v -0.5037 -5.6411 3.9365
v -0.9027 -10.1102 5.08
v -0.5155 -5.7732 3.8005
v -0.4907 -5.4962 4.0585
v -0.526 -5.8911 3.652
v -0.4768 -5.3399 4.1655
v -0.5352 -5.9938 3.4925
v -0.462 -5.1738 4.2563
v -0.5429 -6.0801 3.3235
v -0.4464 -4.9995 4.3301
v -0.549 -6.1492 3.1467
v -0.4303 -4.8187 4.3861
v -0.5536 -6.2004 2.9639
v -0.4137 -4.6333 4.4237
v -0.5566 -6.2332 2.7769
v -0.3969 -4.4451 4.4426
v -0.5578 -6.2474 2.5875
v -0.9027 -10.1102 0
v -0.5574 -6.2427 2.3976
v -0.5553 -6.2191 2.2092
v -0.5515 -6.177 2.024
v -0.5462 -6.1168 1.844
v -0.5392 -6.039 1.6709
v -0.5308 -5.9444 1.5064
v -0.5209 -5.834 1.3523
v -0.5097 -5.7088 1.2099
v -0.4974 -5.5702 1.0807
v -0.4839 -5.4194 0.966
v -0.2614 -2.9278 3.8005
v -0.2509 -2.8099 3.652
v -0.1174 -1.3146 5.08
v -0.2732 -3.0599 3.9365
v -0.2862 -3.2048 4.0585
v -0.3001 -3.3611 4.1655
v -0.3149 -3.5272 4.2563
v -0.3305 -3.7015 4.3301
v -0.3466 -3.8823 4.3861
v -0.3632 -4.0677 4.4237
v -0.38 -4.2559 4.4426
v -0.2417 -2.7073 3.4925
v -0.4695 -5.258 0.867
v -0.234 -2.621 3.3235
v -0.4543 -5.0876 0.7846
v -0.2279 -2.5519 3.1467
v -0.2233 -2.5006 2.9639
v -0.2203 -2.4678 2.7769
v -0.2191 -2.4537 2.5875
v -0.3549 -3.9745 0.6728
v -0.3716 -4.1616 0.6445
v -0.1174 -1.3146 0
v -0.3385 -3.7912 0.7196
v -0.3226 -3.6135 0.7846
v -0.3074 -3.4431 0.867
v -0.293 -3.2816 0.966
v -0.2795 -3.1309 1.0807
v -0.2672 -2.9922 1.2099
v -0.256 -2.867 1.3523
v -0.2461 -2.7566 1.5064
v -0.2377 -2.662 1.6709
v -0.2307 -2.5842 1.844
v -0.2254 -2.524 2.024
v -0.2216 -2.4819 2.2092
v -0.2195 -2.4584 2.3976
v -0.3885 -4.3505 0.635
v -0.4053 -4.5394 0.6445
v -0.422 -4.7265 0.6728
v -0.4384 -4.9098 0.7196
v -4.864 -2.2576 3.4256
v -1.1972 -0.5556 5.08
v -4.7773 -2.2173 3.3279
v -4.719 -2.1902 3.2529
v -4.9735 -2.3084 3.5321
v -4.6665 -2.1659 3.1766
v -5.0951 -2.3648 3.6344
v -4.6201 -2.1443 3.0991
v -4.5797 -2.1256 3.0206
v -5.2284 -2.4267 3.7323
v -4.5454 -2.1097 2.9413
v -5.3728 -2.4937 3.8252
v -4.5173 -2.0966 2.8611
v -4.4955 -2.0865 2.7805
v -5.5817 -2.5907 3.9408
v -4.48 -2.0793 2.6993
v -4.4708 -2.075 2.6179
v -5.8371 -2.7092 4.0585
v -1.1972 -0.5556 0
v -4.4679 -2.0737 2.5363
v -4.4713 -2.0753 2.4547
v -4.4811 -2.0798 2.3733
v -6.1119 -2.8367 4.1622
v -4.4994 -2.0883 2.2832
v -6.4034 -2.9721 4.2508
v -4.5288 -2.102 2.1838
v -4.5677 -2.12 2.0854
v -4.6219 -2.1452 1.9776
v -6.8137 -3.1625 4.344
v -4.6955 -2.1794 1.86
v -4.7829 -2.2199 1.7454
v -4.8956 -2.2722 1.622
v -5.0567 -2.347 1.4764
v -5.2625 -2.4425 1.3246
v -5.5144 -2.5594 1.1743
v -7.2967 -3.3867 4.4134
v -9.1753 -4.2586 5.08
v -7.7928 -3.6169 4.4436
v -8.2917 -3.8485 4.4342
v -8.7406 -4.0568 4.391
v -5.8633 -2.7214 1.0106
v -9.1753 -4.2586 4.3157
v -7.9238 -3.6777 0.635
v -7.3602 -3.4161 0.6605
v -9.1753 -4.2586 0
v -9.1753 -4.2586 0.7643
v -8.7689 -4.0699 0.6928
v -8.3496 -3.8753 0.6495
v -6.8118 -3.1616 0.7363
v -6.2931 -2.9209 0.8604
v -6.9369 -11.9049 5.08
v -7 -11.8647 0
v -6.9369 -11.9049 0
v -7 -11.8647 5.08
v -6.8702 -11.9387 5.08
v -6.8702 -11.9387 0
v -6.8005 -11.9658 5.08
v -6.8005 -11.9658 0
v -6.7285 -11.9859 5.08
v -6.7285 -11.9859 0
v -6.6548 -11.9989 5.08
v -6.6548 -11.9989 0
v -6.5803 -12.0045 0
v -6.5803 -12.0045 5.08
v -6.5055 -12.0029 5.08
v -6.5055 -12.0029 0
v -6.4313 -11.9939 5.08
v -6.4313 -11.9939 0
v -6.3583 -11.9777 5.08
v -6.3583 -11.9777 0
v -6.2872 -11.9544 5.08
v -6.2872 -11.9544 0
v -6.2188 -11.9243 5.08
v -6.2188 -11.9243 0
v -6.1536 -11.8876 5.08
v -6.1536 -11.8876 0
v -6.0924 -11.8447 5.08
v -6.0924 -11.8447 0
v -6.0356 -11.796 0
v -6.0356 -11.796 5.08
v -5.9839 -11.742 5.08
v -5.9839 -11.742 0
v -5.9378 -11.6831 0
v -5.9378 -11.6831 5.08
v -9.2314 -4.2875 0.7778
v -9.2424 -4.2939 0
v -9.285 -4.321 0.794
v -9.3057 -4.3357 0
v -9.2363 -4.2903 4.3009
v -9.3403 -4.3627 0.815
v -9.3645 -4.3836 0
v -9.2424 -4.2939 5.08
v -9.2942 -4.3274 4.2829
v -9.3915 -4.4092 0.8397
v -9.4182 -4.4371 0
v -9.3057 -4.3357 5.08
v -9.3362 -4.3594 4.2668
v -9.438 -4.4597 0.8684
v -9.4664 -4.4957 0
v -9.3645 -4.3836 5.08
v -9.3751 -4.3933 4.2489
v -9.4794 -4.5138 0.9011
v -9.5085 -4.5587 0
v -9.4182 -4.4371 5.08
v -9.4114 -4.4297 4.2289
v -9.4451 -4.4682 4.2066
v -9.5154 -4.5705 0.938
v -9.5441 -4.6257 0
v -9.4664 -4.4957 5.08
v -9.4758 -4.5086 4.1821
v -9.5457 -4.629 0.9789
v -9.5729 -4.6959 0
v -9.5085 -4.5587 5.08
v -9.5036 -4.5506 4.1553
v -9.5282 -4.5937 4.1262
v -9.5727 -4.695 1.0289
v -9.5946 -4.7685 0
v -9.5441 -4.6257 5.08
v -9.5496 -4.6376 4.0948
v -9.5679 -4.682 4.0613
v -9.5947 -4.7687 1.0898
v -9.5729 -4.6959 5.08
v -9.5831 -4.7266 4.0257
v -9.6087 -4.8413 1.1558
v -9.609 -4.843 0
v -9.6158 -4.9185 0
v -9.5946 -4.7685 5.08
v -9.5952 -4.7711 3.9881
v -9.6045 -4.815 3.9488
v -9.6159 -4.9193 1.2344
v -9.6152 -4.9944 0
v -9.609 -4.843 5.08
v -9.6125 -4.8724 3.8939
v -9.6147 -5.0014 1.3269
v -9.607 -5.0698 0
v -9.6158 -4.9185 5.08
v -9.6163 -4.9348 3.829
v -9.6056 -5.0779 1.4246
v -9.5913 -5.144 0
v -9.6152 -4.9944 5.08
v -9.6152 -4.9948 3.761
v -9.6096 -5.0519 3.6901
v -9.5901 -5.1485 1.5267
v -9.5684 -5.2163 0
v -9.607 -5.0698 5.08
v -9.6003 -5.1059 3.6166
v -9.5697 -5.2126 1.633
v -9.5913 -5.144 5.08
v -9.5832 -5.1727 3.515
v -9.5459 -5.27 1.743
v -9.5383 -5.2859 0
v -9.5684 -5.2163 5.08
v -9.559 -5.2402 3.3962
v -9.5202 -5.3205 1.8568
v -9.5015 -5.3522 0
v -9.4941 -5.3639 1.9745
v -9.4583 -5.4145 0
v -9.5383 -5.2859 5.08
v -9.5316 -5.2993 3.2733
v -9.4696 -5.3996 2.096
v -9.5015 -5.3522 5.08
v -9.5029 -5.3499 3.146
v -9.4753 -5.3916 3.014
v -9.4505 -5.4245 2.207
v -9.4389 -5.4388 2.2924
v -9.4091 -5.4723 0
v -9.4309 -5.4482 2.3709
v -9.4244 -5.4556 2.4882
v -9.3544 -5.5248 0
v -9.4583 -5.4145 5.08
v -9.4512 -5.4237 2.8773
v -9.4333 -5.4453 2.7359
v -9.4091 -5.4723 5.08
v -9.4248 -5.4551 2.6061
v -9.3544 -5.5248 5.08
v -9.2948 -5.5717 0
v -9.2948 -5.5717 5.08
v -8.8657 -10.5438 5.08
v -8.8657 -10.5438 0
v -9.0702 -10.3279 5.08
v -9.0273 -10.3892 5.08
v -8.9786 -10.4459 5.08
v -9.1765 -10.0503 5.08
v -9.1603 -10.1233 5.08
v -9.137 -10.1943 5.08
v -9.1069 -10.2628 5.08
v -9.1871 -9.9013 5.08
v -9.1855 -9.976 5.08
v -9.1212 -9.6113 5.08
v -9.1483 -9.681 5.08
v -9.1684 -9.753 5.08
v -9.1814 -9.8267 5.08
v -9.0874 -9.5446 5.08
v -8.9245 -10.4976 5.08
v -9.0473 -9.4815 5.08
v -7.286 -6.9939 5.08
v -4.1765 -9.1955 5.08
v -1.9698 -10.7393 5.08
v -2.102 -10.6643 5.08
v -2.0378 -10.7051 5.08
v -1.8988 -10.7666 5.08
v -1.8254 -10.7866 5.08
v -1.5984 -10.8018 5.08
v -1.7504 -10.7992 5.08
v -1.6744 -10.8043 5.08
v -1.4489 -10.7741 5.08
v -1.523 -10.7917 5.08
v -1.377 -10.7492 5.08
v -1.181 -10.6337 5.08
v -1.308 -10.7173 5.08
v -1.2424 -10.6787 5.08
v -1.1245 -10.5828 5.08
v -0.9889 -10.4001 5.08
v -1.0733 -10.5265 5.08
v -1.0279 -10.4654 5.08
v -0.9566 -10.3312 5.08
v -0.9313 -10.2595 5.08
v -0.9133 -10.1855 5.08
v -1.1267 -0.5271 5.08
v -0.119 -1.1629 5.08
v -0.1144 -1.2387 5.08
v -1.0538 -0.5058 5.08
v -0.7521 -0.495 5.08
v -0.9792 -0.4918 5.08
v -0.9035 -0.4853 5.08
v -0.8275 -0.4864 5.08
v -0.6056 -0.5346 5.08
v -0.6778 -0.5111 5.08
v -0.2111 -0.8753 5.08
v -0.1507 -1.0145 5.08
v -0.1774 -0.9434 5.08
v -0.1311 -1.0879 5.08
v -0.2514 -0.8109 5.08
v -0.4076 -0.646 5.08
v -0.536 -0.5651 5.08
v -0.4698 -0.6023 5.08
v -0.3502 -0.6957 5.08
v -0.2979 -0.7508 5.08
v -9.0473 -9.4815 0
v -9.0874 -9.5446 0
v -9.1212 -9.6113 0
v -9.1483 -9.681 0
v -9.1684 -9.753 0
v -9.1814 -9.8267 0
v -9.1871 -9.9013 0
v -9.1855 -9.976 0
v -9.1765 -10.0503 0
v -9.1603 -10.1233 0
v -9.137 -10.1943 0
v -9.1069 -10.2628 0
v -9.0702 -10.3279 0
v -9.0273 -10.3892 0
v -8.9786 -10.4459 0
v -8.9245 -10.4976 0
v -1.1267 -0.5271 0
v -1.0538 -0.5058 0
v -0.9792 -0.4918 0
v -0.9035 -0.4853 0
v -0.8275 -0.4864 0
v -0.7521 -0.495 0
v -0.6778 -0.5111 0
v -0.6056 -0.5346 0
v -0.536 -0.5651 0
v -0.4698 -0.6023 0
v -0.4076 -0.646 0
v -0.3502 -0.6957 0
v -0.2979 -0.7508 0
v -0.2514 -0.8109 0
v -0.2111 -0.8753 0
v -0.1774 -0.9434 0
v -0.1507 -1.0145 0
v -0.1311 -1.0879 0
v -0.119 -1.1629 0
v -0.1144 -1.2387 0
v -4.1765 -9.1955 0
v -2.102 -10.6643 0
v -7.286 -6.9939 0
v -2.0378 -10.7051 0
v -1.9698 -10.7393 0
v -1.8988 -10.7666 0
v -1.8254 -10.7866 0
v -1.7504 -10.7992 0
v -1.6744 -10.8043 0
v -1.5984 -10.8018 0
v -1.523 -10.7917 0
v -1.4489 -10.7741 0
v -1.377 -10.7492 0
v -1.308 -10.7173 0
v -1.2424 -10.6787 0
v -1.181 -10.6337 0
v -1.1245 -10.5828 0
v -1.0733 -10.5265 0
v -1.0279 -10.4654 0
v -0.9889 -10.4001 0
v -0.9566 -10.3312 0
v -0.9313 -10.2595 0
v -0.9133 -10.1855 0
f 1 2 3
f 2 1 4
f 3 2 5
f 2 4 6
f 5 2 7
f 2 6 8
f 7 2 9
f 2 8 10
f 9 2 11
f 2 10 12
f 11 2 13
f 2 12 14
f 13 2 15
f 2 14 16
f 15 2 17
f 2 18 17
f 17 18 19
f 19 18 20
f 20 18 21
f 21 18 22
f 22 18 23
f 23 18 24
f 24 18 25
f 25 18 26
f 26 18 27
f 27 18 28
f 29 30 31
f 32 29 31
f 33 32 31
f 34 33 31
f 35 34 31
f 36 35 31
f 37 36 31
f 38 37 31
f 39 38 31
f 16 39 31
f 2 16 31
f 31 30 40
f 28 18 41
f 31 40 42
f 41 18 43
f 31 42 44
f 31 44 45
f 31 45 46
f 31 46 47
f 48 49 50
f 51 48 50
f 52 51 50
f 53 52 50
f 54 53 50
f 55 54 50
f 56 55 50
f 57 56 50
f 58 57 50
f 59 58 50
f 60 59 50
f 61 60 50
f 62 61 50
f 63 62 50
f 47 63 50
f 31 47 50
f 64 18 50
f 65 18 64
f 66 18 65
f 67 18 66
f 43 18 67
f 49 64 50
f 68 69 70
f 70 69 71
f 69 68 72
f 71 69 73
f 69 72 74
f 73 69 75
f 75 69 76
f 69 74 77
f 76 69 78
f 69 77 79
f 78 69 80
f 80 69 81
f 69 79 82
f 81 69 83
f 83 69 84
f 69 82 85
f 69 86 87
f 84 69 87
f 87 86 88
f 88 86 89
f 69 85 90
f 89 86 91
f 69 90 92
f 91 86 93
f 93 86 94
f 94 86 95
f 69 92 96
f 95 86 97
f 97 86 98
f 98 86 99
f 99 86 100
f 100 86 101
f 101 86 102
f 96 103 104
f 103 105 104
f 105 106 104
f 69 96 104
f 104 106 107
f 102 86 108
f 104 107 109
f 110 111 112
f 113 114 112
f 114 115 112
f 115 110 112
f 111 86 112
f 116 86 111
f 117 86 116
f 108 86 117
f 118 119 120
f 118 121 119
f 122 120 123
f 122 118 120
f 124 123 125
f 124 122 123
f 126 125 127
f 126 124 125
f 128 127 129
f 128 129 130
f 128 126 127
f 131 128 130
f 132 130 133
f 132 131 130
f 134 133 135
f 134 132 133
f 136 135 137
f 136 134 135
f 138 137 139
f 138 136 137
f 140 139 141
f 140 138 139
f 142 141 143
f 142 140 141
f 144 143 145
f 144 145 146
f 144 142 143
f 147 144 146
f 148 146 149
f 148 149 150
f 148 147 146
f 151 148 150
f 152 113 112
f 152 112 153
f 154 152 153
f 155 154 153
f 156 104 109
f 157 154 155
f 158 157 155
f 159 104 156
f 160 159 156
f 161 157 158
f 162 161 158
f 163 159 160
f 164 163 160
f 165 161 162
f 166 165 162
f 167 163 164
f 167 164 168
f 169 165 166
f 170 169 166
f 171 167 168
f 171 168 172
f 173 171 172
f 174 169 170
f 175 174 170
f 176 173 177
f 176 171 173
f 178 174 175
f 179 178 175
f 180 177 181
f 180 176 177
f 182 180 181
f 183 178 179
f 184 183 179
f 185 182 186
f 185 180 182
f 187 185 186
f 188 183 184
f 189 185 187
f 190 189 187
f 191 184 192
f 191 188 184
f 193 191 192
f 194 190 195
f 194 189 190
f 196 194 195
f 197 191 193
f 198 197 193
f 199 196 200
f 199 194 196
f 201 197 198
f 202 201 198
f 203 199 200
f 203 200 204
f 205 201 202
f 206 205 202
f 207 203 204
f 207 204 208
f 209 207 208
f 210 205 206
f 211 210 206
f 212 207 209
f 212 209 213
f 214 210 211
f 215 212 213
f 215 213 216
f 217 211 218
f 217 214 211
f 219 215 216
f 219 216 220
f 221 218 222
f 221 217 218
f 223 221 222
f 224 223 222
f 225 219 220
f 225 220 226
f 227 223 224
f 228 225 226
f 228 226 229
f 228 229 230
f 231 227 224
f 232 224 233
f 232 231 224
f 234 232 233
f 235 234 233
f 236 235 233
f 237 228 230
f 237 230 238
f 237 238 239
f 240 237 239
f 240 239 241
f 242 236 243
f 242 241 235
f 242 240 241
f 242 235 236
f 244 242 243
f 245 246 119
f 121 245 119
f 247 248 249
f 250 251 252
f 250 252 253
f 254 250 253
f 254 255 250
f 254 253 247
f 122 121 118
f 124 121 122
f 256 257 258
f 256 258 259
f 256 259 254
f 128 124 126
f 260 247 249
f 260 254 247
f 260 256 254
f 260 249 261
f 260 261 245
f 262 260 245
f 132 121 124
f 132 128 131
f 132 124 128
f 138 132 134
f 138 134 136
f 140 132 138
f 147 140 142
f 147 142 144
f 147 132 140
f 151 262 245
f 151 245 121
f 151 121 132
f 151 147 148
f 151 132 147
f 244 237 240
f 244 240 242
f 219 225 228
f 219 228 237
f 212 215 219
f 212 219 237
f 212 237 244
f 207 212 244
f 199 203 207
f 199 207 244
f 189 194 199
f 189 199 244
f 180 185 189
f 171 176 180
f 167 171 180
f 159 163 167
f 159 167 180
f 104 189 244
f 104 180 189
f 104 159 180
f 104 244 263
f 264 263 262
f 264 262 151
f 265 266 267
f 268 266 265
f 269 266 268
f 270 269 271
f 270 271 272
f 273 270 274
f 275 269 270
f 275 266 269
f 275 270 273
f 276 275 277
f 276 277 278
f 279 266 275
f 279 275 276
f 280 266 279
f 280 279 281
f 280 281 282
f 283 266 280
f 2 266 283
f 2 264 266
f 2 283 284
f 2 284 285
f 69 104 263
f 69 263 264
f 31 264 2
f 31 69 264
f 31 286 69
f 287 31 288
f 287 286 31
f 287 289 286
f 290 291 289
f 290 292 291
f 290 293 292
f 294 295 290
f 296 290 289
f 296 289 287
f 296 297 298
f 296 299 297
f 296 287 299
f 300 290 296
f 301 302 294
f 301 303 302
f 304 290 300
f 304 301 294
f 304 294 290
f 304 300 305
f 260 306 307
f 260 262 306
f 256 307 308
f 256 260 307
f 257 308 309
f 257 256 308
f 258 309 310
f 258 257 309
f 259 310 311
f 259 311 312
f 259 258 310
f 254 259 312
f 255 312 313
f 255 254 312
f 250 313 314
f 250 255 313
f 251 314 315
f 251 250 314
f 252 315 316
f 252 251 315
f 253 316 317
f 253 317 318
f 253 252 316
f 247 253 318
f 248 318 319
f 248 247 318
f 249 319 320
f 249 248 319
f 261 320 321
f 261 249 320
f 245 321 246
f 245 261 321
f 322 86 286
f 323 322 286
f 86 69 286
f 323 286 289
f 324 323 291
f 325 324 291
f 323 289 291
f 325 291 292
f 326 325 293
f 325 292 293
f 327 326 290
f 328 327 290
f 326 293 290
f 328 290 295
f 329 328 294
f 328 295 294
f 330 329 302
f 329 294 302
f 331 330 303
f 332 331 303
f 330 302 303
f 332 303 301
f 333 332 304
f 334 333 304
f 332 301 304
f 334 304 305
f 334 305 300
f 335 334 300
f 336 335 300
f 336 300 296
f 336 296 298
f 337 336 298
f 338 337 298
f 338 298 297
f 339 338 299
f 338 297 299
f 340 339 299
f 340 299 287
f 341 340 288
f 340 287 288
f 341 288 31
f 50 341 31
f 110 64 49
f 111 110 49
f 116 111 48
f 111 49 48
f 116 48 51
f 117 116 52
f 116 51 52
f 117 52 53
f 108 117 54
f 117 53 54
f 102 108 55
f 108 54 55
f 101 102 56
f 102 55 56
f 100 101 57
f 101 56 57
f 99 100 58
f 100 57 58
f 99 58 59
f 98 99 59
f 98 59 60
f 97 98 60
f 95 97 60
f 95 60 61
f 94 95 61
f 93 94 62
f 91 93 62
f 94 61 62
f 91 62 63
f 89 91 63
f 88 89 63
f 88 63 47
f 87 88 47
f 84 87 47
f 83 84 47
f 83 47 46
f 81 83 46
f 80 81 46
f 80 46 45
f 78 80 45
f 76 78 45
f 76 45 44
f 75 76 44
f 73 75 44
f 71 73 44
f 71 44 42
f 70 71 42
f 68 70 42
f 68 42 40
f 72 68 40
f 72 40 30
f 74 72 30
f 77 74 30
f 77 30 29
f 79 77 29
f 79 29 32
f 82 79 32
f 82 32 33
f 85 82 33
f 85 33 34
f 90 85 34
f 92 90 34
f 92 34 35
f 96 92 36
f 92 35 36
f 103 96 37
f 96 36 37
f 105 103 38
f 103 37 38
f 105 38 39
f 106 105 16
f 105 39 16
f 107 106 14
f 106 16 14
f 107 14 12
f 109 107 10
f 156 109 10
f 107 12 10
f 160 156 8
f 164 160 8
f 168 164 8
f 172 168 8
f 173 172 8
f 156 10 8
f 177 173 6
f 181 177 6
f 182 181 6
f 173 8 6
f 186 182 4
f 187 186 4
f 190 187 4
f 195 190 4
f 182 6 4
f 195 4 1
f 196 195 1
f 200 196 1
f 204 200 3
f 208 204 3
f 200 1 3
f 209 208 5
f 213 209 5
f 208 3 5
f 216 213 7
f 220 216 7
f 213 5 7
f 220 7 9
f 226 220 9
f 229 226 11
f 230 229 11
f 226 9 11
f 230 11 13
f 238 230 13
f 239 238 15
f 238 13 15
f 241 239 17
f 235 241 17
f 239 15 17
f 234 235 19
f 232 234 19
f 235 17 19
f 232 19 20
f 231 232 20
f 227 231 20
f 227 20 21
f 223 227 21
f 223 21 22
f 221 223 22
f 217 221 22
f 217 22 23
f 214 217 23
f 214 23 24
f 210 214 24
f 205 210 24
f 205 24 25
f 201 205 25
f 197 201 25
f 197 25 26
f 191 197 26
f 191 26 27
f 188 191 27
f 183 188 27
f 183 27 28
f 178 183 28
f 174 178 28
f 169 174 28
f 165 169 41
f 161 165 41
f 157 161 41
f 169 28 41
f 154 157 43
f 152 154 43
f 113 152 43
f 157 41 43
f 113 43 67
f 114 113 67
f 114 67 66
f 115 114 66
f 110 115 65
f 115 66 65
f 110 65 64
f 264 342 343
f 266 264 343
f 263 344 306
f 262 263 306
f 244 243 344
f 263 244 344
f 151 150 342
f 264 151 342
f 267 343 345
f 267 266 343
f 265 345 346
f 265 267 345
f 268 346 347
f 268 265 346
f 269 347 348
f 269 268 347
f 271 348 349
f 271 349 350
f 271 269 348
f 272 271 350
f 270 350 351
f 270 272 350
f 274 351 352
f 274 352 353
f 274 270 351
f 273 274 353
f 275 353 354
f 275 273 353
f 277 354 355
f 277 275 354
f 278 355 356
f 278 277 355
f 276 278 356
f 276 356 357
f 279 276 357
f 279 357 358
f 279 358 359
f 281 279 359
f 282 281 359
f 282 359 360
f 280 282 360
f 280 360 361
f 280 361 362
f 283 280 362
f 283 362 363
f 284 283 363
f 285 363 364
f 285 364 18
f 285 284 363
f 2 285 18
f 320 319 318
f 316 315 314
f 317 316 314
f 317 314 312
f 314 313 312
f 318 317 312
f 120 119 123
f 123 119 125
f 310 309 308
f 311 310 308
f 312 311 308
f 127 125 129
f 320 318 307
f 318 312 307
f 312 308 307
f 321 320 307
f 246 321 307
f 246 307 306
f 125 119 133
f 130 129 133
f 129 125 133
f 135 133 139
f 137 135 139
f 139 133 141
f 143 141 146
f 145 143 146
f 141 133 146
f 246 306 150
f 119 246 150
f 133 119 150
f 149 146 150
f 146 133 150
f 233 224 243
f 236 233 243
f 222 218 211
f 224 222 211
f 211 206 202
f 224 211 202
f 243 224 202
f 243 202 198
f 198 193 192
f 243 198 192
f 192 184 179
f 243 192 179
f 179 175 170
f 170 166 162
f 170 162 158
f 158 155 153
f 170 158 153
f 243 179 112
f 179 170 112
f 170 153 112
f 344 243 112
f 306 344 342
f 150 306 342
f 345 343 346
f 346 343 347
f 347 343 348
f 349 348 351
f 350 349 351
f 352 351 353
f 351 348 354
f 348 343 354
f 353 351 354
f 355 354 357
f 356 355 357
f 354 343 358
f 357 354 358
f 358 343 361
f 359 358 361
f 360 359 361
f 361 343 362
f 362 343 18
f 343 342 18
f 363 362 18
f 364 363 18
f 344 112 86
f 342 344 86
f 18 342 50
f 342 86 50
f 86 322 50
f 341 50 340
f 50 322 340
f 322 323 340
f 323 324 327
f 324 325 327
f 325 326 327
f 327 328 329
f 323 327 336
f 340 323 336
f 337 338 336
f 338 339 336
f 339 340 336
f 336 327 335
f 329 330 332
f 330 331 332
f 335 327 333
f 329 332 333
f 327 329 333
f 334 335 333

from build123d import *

# Parameters (mm, degrees)
BOSS_EXTRUDE1_DEPTH = 5.08
FILLET1_R           = 0.762
SKETCH2_R           = 1.905
CUT_EXTRUDE1_DEPTH  = 10.53526285


with BuildPart() as part:
    # Sketch1 → Boss-Extrude1 (new body)
    with BuildSketch(Plane.XY):
        Polygon((0, 0), (-10.367708313, -4.812018738), (-7.286004456, -6.993932896), (-9.487605847, -10.103442715), (-6.378096028, -12.305044107), (-4.176494637, -9.195534288), (-1.020567729, -11.43), align=None)
    extrude(amount=BOSS_EXTRUDE1_DEPTH)

    # Fillet1
    fillet1_edges = [part.edges().sort_by_distance(p)[0] for p in [
        (-1.020567729, -11.43, 2.54),
        (-6.378096028, -12.305044107, 2.54),
        (-9.487605847, -10.103442715, 2.54),
        (-10.367708313, -4.812018738, 2.54),
        (0, 0, 2.54),
    ]]
    fillet(fillet1_edges, radius=FILLET1_R)

    # Sketch2 → Cut-Extrude1 (cut, through all)
    with BuildSketch(Plane(origin=(0, 0, 0), x_dir=(0, 0, -1), z_dir=(0.996037458, -0.088934706, 0))):
        with Locations((-2.54, -4.367822715)):
            Circle(SKETCH2_R)
    extrude(amount=-CUT_EXTRUDE1_DEPTH, mode=Mode.SUBTRACT)


solid = part.part
